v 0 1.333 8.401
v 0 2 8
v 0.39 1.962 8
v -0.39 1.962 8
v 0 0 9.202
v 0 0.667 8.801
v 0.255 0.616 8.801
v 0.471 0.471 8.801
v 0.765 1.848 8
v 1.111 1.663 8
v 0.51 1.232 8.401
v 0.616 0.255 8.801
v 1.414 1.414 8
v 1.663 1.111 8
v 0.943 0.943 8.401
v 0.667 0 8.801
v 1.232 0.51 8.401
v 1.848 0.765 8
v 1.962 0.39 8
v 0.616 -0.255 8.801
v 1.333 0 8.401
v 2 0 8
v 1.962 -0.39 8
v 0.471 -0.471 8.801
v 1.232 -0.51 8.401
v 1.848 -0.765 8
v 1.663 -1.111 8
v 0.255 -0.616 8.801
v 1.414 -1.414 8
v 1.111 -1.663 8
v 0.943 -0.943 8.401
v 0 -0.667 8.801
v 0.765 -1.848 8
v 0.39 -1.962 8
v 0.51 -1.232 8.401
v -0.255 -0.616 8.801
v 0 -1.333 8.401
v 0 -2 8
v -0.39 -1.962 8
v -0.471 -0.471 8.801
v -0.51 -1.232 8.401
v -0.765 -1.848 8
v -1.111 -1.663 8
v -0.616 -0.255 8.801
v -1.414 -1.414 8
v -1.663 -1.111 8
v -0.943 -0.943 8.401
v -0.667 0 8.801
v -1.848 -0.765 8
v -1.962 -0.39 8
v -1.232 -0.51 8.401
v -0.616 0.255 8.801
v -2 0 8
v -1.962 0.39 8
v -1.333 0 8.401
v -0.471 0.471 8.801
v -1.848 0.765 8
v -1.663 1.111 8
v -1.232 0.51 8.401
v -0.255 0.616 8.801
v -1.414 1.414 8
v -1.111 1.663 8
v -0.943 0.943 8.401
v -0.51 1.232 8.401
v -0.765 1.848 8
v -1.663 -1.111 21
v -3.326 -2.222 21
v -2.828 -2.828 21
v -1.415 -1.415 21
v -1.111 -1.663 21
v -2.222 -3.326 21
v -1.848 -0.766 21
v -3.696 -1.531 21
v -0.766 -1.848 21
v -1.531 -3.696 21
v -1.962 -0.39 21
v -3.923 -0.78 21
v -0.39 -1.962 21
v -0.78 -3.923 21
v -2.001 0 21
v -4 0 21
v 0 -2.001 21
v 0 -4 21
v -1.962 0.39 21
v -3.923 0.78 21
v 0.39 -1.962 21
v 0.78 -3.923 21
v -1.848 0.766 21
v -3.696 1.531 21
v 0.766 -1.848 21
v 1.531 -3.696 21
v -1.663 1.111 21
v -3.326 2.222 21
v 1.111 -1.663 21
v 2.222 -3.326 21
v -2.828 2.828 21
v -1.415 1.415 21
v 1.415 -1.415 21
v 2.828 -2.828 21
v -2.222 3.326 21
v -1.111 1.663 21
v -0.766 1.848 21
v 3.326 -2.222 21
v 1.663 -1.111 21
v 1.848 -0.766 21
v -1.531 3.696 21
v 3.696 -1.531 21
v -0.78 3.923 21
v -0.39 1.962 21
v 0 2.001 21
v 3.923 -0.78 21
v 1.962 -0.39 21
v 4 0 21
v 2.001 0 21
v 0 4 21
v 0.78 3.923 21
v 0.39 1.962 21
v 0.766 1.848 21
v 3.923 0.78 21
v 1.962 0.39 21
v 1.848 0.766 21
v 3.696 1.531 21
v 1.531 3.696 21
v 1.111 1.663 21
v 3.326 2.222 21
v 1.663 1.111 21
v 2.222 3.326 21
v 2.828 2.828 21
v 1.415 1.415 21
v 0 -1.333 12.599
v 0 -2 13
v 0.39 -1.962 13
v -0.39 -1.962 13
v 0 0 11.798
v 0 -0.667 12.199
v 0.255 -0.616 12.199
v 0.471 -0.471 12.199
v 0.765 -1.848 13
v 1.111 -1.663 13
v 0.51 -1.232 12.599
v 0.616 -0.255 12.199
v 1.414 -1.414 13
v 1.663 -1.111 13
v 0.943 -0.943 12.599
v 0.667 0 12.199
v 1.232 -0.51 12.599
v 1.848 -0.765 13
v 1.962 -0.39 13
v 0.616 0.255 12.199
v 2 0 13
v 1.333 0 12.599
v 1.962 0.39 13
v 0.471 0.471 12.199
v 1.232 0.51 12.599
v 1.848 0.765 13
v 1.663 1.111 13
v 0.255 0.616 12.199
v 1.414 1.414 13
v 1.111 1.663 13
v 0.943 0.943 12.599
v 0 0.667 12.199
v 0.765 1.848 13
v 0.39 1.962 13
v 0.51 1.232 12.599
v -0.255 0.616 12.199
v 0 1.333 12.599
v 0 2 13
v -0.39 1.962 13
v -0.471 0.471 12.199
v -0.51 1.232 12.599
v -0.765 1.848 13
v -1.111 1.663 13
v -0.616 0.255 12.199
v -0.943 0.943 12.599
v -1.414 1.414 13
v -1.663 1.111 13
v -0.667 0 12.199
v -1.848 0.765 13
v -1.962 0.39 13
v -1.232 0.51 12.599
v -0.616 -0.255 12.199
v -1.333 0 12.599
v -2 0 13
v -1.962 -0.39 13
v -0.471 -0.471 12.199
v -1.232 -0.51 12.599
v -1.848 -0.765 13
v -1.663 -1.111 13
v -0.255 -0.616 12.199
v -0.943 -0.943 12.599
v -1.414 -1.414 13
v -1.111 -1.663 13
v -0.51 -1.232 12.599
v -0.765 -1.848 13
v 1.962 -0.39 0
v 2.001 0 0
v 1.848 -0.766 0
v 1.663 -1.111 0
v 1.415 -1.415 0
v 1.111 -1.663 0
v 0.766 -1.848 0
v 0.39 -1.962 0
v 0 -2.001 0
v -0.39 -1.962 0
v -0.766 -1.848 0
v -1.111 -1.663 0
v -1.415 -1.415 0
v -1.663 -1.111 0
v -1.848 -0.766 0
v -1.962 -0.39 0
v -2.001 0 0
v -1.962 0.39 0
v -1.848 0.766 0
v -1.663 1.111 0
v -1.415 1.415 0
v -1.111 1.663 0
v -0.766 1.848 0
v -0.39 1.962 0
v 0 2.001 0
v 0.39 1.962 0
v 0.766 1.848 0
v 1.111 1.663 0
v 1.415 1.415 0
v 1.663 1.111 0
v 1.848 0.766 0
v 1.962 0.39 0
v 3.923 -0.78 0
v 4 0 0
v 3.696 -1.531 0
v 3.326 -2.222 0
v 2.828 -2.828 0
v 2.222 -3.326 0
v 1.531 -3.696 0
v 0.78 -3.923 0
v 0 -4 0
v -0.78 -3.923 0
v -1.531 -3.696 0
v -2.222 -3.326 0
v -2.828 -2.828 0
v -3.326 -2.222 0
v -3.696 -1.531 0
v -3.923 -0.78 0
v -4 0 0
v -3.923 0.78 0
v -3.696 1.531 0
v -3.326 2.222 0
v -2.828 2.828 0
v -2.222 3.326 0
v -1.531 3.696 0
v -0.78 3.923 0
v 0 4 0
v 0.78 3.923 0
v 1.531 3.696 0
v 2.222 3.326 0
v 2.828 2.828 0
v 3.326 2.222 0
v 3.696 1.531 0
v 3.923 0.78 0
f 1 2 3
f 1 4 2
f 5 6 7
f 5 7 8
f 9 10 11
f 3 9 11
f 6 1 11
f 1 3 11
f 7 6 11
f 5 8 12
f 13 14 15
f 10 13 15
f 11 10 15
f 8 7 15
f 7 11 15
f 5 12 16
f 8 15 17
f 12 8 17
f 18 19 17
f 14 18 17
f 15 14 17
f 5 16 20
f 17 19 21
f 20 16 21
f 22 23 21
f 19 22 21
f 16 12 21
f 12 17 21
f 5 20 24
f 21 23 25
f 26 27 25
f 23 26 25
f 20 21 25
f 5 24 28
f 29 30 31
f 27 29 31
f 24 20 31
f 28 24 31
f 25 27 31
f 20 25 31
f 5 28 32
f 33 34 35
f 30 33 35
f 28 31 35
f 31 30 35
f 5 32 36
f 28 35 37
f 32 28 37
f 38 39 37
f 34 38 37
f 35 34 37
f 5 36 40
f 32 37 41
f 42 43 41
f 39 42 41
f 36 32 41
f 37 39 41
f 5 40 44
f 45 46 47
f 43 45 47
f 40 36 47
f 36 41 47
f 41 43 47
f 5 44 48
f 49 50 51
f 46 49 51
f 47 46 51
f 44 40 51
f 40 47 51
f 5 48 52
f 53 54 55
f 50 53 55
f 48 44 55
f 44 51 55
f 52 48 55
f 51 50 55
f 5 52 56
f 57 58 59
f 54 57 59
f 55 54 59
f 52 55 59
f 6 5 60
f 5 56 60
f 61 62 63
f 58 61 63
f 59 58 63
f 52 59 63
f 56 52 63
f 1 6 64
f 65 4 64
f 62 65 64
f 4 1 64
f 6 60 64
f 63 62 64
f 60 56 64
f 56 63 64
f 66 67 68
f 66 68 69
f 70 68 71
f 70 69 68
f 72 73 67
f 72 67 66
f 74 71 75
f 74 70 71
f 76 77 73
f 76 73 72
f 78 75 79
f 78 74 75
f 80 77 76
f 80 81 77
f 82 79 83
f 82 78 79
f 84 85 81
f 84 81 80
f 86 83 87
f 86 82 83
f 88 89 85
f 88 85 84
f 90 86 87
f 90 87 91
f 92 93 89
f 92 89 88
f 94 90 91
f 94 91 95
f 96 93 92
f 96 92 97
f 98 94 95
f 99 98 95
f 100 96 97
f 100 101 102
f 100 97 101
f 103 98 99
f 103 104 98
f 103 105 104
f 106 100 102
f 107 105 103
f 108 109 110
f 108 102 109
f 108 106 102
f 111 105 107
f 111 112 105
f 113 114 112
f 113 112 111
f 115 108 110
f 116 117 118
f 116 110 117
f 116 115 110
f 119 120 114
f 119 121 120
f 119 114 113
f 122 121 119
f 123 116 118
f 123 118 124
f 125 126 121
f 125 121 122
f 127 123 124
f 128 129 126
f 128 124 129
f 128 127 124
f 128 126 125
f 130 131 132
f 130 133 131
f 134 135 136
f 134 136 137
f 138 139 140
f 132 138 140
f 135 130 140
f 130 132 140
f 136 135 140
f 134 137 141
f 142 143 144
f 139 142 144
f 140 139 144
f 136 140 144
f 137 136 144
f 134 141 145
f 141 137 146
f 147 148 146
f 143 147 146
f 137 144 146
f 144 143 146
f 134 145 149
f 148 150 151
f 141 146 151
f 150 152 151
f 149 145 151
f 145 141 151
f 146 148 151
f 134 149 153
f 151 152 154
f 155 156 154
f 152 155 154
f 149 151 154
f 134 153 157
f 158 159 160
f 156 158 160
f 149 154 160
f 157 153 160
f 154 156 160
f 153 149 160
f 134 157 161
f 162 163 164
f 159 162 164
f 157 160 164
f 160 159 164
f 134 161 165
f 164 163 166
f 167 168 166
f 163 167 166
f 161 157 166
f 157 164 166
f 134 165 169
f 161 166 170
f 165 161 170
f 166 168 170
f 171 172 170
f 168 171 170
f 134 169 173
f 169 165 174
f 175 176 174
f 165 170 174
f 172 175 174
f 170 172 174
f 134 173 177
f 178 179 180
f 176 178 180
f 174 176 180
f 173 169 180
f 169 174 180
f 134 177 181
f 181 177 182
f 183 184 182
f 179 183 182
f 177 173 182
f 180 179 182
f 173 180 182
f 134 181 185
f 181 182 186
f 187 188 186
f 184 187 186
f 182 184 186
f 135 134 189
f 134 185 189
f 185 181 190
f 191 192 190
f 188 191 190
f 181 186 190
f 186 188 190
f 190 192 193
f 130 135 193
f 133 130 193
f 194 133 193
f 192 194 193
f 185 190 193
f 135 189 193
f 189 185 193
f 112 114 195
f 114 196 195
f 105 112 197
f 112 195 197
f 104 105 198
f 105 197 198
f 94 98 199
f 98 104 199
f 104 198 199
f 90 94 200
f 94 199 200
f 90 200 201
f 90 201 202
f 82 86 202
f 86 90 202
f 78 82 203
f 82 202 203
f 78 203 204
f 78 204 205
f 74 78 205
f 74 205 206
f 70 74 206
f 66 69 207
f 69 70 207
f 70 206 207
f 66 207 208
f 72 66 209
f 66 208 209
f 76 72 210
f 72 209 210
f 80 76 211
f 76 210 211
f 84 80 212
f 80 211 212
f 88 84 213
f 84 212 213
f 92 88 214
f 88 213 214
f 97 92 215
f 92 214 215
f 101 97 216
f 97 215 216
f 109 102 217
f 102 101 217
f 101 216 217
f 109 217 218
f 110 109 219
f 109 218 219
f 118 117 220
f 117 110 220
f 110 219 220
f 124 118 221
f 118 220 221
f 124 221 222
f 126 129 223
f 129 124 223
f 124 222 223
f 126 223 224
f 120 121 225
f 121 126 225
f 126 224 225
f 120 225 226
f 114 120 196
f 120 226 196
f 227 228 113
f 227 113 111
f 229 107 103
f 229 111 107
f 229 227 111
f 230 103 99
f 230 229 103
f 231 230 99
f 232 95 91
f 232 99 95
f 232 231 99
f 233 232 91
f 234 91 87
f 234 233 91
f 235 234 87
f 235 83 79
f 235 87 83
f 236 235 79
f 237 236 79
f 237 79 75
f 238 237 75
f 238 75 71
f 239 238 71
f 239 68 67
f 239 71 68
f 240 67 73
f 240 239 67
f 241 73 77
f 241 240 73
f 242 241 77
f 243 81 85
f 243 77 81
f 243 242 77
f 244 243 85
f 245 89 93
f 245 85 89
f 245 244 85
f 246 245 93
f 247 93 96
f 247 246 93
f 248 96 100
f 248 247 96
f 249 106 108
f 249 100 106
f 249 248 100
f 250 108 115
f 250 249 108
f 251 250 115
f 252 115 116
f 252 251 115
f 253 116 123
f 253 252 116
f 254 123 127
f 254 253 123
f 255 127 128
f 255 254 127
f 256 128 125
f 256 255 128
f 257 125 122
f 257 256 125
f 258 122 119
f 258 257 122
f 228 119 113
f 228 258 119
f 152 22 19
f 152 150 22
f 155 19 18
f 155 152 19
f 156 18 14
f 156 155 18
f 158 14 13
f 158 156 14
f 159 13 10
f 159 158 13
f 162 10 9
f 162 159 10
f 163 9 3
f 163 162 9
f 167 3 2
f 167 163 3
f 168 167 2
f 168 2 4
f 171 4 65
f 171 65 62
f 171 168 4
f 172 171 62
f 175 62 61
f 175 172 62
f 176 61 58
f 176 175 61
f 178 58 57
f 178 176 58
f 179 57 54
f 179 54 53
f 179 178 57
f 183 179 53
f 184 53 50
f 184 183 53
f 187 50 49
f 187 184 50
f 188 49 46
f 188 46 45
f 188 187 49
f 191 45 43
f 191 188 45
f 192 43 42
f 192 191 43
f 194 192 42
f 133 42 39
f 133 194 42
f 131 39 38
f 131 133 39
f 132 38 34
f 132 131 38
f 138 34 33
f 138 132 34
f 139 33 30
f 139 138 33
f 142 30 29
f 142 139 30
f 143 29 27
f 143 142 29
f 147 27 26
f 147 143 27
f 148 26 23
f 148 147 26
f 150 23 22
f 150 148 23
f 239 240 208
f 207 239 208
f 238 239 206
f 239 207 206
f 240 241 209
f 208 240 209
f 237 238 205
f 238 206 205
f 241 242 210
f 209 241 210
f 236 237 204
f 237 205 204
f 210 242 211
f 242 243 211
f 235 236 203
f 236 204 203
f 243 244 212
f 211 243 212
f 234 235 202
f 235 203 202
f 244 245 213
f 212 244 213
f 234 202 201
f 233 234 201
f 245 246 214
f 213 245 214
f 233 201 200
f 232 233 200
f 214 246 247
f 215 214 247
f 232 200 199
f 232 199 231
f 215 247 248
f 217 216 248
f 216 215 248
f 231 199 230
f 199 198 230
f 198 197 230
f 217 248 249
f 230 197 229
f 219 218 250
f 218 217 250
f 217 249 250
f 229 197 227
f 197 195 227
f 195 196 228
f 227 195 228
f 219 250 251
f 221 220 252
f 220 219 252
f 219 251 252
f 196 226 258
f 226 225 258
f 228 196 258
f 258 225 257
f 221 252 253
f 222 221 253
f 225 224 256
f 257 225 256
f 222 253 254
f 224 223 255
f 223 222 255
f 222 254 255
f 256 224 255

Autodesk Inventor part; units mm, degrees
ref_plane "YZ Plane" through (0, 0, 0) normal (1, 0, 0) x (0, 1, 0)
ref_plane "XZ Plane" through (0, 0, 0) normal (0, 1, 0) x (-1, 0, 0)
ref_plane "XY Plane" through (0, 0, 0) normal (0, 0, 1) x (1, 0, 0)
sketch "スケッチ1" plane through (0, 0, 0) normal (0, 0, 1) x (1, 0, 0)
  circle A0 centre (0, 0) radius 4
  circle A1 centre (0, 0) radius 2.0005
  dimension "d0" = 8
  dimension "d1" = 4.001
extrude "押し出し1" add sketch "スケッチ1" along normal blind 21
sketch "スケッチ2" plane through (0, 0, 21) normal (0, 0, 1) x (1, 0, 0)
  circle A0 centre (0, 0) radius 2
  dimension "d4" = 4
extrude "押し出し2" add sketch "スケッチ2" against normal blind 20
hole "穴1" at (0, 0, 21) direction (0, 0, -1) diameter 4 depth 8 tip angle 118
hole "穴2" at (0, 0, 0) direction (0, 0, 1) diameter 4 depth 8 tip angle 118
properties part number "スペーサーm4-21　簡易筒型" material "アルミニウム 2014-T4"
